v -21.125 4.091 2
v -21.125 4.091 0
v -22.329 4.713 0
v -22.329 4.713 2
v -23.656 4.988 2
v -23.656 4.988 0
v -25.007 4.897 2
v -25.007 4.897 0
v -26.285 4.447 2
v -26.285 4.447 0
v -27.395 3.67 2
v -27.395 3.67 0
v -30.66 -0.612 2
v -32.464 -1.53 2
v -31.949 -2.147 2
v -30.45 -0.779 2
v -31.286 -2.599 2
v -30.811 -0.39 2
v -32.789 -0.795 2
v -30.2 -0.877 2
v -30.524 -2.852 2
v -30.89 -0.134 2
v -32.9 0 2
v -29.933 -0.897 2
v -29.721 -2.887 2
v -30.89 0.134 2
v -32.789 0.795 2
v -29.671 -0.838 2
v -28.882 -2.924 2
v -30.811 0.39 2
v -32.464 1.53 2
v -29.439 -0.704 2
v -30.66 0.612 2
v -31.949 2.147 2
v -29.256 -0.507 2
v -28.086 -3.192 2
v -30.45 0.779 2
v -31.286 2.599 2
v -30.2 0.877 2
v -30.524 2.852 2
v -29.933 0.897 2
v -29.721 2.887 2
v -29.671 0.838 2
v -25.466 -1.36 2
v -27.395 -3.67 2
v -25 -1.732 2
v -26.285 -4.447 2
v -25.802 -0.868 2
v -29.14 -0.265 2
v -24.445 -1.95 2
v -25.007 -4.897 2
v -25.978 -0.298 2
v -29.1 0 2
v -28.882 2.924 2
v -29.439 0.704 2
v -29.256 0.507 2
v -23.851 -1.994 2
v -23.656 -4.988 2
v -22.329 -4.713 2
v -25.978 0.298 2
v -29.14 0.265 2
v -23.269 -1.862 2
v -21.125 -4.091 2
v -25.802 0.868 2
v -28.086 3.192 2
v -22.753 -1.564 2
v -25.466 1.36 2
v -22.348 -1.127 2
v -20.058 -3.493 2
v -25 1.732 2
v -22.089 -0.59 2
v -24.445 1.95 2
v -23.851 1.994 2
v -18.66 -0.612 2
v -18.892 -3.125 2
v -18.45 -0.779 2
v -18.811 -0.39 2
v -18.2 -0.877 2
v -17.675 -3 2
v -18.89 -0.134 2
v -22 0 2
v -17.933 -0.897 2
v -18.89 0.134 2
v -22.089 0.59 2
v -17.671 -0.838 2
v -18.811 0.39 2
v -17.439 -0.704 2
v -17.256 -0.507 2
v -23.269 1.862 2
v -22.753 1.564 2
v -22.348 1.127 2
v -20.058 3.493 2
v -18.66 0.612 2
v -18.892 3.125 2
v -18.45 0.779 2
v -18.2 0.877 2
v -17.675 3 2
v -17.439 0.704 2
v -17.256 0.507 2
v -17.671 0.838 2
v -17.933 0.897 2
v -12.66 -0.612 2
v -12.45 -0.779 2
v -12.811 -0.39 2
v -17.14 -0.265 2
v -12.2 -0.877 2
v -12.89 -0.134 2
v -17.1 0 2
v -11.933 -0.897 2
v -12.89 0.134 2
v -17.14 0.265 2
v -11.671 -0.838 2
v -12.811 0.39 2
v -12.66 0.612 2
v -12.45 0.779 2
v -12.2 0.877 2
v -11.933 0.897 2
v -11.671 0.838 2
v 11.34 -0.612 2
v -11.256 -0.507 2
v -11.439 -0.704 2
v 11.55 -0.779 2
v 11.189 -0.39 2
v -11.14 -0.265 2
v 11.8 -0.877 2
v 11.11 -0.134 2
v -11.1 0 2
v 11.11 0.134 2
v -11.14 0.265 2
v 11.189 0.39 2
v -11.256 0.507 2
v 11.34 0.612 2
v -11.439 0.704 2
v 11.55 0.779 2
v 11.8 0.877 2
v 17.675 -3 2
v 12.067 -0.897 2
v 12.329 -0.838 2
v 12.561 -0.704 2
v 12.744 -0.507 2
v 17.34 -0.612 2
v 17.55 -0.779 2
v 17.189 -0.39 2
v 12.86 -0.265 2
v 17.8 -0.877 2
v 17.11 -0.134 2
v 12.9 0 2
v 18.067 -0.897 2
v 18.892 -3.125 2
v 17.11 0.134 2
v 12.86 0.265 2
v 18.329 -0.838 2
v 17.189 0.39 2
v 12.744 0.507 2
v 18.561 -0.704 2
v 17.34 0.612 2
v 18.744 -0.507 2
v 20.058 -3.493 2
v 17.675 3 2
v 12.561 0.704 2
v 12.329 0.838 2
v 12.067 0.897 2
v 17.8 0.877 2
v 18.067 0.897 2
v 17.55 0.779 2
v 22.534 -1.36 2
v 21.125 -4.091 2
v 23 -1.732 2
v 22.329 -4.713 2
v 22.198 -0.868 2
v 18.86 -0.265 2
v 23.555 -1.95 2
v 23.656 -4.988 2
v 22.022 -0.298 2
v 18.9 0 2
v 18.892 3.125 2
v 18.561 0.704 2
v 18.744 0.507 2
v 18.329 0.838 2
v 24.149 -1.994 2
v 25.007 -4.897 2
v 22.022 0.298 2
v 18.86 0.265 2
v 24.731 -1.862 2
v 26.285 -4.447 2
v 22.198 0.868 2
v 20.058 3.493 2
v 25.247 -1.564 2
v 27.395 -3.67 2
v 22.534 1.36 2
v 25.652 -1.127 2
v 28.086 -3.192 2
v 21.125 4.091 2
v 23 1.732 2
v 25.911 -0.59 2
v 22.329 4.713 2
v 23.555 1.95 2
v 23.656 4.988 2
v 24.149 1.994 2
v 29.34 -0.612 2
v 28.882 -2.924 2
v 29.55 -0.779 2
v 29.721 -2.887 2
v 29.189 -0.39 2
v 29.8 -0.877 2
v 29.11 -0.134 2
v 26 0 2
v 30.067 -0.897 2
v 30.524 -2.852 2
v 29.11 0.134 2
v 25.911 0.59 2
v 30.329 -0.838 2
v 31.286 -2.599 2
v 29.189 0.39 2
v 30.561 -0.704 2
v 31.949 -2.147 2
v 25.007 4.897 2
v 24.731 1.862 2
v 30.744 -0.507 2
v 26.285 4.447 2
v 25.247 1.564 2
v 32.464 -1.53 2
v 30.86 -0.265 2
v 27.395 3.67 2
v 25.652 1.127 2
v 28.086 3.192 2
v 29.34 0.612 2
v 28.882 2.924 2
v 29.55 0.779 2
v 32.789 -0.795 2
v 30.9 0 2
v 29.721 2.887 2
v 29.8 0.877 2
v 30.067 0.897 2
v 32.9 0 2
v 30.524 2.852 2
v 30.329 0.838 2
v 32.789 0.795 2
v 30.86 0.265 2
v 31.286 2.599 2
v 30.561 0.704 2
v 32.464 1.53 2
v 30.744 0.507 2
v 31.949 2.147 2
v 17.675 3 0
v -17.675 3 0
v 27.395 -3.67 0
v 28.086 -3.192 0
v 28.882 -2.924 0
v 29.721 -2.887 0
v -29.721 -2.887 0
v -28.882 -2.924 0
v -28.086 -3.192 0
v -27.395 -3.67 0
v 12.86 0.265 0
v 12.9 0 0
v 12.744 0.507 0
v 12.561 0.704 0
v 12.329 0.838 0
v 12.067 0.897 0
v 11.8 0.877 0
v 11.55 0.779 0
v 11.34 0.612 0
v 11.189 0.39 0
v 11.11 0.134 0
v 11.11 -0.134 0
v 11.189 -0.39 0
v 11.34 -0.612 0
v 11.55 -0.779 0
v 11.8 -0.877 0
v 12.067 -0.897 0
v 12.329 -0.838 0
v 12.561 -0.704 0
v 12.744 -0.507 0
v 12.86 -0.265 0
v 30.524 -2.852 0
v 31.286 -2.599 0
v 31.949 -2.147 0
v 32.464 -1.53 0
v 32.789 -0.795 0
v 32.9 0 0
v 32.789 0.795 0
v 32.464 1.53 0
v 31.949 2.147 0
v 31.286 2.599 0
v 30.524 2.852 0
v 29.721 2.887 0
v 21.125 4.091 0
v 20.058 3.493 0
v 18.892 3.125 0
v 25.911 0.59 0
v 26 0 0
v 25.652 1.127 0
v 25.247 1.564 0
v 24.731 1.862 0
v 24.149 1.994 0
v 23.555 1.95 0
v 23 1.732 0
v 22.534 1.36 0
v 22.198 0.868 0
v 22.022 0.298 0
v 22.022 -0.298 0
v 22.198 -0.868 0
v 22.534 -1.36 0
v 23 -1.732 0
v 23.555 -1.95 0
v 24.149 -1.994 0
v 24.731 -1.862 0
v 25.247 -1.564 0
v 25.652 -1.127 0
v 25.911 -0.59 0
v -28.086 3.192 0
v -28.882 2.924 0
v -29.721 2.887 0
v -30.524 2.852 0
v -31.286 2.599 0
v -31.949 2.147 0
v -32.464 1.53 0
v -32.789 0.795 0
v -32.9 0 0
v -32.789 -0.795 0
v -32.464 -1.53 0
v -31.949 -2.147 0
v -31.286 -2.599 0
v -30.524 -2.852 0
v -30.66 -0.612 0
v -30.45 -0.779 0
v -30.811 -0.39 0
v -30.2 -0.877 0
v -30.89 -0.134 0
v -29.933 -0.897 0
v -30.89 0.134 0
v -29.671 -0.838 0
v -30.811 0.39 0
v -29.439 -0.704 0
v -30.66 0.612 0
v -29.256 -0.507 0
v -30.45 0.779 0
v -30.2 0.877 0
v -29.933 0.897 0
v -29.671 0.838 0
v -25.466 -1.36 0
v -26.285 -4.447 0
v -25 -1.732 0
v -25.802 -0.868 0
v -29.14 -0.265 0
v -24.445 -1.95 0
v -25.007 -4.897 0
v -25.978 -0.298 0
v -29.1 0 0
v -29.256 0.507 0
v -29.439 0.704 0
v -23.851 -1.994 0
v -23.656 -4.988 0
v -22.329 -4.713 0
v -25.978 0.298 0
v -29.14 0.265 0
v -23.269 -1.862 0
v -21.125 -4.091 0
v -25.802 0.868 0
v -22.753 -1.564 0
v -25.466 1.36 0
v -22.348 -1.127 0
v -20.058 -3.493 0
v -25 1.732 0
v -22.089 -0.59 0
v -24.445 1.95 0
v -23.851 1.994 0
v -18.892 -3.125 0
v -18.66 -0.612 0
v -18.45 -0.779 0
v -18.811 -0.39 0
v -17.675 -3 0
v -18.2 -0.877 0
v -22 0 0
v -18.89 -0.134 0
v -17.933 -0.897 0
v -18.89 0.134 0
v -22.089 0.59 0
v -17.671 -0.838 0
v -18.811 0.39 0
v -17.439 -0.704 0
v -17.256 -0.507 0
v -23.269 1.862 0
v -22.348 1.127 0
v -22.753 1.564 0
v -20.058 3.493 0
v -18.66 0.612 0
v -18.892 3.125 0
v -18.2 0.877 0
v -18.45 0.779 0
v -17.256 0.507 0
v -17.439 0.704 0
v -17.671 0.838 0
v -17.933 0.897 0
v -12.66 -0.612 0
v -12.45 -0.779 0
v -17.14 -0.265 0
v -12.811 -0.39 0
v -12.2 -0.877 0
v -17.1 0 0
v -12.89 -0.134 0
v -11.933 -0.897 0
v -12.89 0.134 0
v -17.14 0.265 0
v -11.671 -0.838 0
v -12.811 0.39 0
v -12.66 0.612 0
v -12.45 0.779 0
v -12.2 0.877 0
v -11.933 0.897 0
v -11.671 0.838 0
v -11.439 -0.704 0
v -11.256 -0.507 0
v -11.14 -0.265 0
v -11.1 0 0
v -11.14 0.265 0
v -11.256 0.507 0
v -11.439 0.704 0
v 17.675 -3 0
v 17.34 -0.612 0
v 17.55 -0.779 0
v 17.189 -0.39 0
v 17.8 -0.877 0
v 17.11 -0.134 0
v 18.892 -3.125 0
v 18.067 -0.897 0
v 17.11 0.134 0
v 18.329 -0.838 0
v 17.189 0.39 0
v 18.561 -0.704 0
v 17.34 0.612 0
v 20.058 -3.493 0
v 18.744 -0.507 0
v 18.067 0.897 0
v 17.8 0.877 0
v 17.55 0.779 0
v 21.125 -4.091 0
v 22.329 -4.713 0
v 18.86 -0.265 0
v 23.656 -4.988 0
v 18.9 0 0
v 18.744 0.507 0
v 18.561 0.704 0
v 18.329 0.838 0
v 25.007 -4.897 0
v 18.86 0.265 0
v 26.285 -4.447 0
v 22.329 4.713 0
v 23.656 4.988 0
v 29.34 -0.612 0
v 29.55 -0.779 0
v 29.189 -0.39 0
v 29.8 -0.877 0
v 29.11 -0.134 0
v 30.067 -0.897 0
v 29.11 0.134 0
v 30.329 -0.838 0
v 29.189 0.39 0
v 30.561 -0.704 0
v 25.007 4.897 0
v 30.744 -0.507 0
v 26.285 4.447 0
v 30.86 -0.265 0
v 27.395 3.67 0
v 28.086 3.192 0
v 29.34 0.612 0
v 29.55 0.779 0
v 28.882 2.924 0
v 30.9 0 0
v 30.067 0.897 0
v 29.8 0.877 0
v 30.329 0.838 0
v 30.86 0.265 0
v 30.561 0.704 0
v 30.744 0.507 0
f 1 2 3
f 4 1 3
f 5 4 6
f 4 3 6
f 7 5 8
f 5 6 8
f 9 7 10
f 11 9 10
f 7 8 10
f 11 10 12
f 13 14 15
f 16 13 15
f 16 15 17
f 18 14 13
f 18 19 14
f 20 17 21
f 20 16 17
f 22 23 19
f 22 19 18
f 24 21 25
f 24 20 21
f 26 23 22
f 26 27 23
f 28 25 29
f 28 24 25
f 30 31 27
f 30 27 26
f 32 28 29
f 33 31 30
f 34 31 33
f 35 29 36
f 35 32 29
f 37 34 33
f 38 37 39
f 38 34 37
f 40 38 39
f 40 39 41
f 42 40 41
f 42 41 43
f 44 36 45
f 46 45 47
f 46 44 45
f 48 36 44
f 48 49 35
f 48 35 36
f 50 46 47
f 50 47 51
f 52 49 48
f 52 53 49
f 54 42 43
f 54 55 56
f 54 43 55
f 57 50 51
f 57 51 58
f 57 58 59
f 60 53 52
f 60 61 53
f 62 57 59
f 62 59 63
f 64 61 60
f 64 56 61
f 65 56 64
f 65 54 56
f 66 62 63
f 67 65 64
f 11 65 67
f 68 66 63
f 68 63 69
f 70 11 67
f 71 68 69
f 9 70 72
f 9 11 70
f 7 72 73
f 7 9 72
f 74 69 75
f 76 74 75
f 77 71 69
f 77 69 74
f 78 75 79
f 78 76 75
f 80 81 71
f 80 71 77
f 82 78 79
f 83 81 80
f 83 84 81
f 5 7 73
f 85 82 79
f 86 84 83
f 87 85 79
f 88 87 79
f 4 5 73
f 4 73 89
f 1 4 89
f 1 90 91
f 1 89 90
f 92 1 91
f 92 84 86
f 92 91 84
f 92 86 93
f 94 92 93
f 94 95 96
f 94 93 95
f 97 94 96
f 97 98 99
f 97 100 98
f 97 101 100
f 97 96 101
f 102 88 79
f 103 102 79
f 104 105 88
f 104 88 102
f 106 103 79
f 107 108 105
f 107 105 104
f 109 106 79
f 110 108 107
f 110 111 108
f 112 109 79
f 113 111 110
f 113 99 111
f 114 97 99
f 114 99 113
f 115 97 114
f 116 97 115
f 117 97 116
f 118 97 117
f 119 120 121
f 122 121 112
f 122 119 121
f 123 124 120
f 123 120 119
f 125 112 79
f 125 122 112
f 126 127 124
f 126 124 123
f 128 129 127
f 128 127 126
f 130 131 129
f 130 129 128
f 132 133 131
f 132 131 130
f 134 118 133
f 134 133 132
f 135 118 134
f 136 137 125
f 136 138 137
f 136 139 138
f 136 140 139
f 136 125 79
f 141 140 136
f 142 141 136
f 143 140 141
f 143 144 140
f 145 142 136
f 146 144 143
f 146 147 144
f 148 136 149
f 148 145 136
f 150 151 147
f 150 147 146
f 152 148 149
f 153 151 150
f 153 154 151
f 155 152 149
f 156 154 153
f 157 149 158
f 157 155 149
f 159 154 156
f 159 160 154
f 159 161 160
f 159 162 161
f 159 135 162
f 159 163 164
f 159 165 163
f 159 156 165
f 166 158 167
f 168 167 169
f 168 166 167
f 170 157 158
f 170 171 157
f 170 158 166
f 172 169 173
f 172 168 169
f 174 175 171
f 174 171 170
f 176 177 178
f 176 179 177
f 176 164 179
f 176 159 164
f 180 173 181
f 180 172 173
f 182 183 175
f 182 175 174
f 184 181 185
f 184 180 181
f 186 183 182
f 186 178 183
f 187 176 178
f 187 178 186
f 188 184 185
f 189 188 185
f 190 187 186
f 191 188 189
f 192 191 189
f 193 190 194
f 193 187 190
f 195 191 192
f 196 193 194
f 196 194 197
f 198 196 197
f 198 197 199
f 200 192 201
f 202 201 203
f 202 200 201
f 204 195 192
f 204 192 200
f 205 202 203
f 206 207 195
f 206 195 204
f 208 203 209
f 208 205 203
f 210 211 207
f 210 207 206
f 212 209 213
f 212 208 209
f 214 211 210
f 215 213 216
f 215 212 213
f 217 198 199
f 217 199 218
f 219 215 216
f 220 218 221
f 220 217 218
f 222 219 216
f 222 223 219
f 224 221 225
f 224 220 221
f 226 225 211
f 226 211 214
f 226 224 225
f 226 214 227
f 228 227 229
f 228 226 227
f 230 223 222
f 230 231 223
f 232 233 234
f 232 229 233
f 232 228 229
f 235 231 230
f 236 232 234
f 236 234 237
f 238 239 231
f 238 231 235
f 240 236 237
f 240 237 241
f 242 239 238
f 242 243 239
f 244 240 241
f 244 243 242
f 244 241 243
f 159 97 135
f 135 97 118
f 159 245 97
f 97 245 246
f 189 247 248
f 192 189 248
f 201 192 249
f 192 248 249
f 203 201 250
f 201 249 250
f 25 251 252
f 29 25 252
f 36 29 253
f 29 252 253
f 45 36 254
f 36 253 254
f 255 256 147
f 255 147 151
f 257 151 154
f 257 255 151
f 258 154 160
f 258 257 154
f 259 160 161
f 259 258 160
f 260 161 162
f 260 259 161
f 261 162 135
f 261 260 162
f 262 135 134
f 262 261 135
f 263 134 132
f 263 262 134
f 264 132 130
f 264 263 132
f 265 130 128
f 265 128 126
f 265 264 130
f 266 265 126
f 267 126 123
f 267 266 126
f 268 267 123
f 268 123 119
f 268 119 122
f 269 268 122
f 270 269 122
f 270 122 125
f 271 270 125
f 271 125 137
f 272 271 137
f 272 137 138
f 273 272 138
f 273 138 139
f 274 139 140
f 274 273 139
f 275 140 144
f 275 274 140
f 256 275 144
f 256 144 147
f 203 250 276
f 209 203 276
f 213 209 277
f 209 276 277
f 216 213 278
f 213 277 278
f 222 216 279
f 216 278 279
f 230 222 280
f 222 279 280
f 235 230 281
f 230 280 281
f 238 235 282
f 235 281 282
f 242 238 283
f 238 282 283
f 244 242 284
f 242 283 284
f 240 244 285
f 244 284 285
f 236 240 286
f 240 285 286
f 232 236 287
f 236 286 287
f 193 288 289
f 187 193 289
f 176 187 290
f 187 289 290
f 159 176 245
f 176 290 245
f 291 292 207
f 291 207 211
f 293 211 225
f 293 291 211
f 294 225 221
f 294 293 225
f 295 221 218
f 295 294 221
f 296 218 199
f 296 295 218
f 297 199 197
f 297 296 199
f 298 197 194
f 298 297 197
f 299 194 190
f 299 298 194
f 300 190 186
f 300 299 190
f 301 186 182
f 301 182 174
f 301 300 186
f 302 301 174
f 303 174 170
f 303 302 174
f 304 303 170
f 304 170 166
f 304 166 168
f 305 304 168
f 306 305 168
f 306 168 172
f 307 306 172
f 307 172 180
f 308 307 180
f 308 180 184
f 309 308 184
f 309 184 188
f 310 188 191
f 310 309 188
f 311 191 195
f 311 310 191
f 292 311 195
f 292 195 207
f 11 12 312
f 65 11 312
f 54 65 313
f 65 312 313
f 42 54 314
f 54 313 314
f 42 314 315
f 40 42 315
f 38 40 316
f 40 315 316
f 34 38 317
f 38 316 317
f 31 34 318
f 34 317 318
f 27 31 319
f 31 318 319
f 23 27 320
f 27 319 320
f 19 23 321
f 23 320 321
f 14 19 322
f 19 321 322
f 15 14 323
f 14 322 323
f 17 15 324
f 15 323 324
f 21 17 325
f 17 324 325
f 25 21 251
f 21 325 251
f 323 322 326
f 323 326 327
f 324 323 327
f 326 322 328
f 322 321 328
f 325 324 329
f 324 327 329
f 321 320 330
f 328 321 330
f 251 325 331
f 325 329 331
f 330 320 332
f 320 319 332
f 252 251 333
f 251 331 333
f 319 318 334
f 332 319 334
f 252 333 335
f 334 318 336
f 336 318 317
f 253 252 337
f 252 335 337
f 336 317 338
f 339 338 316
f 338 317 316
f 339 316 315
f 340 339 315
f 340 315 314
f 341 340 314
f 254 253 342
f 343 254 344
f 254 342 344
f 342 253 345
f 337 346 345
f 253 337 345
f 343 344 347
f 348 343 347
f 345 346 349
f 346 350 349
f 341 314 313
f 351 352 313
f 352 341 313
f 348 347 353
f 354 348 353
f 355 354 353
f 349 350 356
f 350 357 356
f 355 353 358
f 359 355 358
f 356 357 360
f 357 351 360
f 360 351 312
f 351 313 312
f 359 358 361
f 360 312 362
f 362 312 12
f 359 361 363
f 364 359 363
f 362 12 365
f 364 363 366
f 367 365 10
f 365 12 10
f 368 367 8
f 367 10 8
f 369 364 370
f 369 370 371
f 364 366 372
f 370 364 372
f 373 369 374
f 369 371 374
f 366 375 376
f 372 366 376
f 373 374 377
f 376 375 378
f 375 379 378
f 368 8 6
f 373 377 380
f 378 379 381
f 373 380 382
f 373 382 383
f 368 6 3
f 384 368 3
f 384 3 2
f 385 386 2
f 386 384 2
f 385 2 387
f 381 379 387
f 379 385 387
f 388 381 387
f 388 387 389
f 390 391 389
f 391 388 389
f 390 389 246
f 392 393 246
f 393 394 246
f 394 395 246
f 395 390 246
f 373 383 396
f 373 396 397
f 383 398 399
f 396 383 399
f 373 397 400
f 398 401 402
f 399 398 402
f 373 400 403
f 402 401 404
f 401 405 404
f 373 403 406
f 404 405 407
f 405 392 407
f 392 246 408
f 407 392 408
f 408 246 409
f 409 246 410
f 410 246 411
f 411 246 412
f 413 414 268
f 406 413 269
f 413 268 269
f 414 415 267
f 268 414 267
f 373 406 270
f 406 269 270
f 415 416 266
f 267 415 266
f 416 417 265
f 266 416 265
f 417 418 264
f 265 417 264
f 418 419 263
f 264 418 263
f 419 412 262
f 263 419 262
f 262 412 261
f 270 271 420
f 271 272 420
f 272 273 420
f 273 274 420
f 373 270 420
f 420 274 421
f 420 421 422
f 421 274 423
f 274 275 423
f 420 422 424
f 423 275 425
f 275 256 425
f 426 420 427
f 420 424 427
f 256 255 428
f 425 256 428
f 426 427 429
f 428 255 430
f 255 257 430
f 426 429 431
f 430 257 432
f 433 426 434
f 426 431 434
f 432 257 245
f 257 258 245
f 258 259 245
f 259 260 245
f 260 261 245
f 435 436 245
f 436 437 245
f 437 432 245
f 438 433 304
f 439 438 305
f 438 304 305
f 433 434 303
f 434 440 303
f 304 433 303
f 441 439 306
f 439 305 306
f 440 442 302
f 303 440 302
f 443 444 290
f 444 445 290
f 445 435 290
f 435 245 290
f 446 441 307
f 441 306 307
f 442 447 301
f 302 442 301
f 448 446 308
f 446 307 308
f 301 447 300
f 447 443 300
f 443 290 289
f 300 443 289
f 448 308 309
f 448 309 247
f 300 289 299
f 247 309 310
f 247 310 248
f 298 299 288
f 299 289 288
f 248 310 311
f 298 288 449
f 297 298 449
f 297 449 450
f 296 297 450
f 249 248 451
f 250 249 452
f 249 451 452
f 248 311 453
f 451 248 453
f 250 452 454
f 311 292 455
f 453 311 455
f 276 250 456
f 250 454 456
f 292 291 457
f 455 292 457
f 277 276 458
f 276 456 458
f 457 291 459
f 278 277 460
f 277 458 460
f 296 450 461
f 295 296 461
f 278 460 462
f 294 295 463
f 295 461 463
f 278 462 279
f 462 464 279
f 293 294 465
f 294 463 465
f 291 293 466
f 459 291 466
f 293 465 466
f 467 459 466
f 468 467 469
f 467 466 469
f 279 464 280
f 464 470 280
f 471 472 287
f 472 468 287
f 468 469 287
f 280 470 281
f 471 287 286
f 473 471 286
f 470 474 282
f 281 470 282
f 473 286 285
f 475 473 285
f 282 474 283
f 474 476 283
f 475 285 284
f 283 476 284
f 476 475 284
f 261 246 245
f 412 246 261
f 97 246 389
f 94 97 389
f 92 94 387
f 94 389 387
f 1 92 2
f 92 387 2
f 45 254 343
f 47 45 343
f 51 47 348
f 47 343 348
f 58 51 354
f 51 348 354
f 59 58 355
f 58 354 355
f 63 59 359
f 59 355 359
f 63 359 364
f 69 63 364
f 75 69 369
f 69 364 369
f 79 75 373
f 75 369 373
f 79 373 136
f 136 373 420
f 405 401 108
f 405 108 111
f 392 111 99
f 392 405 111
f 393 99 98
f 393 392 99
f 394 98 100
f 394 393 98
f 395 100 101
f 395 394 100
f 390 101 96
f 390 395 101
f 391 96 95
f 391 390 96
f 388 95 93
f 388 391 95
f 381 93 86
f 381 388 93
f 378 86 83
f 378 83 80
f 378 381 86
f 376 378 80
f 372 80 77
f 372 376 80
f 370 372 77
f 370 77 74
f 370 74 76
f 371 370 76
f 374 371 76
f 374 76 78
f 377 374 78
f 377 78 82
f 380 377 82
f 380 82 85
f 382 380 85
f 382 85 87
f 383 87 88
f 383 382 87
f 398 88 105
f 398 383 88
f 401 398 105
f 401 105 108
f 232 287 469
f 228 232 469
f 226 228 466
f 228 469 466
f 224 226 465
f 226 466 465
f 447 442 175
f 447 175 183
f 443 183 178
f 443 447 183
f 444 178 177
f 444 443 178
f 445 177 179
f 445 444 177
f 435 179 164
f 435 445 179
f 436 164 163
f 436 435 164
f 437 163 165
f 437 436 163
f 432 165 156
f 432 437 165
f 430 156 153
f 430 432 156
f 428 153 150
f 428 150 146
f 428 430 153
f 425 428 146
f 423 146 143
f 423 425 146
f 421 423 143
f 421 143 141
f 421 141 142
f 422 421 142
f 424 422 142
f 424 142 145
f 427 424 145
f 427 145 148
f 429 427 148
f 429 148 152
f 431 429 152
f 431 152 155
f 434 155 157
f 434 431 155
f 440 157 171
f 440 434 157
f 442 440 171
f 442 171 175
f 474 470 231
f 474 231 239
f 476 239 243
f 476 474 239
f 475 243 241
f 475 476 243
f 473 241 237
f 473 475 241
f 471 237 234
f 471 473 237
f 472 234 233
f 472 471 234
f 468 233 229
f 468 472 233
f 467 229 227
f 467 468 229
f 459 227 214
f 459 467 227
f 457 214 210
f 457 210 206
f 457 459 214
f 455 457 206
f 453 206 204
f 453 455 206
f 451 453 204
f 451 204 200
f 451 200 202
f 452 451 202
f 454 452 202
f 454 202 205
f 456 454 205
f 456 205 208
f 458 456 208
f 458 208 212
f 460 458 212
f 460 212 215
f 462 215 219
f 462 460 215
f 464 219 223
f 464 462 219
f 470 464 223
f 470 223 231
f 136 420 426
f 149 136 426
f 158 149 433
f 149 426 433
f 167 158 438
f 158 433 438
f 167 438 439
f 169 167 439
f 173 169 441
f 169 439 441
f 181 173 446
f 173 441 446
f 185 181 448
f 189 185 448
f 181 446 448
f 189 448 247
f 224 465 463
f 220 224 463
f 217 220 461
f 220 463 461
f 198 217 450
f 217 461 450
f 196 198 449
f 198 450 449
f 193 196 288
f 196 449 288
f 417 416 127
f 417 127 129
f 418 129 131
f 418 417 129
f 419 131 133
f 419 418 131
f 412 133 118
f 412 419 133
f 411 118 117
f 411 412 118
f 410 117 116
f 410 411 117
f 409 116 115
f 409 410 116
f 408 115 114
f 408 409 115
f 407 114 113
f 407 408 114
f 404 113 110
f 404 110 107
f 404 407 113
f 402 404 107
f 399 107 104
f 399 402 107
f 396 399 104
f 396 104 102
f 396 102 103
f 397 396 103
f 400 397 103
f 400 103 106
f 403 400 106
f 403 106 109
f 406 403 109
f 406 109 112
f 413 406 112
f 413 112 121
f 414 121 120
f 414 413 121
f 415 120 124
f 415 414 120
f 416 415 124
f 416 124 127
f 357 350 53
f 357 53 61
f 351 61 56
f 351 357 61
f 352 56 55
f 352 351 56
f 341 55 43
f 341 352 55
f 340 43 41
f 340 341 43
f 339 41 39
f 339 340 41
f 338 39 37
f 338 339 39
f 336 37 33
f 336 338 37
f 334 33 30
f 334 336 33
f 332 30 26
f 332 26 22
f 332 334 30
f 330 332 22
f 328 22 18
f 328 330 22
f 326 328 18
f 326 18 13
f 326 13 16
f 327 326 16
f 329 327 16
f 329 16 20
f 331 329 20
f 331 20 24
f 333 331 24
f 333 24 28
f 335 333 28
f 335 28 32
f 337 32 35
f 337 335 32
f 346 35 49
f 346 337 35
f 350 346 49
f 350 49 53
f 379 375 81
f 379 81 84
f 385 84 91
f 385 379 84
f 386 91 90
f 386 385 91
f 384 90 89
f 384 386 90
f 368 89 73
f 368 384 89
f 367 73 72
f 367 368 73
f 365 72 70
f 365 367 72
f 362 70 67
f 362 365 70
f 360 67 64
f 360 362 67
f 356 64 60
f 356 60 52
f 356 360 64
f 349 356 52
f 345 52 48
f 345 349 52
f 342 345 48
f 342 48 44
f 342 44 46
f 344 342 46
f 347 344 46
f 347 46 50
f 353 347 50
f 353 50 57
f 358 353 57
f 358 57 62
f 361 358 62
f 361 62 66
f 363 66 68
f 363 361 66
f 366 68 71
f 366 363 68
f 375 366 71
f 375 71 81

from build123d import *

# Parameters (mm, degrees)
F0_R     = 0.9
F0_R_2   = 2
F1_DEPTH = 2


with BuildPart() as f1:
    # F0 (on Top) → F1 (new body)
    with BuildSketch(Plane.XY):
        with BuildLine():
            Line((-17.6754446797, -3), (0, -3))
            Line((0, -3), (17.6754446797, -3))
            ThreePointArc((17.6754446797, -3), (19.4845127471, -3.2792244645), (21.1252021271, -4.0909090909))
            ThreePointArc((21.1252021271, -4.0909090909), (24.3345748945, -4.9887934052), (27.3953125, -3.6704022978))
            ThreePointArc((27.3953125, -3.6704022978), (28.474361287, -3.0297630587), (29.721059322, -2.8865536715))
            ThreePointArc((29.721059322, -2.8865536715), (32.9, 0), (29.721059322, 2.8865536715))
            ThreePointArc((29.721059322, 2.8865536715), (28.474361287, 3.0297630587), (27.3953125, 3.6704022978))
            ThreePointArc((27.3953125, 3.6704022978), (24.3345748945, 4.9887934052), (21.1252021271, 4.0909090909))
            ThreePointArc((21.1252021271, 4.0909090909), (19.4845127471, 3.2792244645), (17.6754446797, 3))
            Line((17.6754446797, 3), (0, 3))
            Line((0, 3), (-17.6754446797, 3))
            ThreePointArc((-17.6754446797, 3), (-19.4845127471, 3.2792244645), (-21.1252021271, 4.0909090909))
            ThreePointArc((-21.1252021271, 4.0909090909), (-24.3345748945, 4.9887934052), (-27.3953125, 3.6704022978))
            ThreePointArc((-27.3953125, 3.6704022978), (-28.474361287, 3.0297630587), (-29.721059322, 2.8865536715))
            ThreePointArc((-29.721059322, 2.8865536715), (-32.9, 0), (-29.721059322, -2.8865536715))
            ThreePointArc((-29.721059322, -2.8865536715), (-28.474361287, -3.0297630587), (-27.3953125, -3.6704022978))
            ThreePointArc((-27.3953125, -3.6704022978), (-24.3345748945, -4.9887934052), (-21.1252021271, -4.0909090909))
            ThreePointArc((-21.1252021271, -4.0909090909), (-19.4845127471, -3.2792244645), (-17.6754446797, -3))
        make_face()
        with Locations((-30, 0)):
            Circle(F0_R, mode=Mode.SUBTRACT)
        with Locations((-24, 0)):
            Circle(F0_R_2, mode=Mode.SUBTRACT)
        with Locations((-18, 0)):
            Circle(F0_R, mode=Mode.SUBTRACT)
        with Locations((-12, 0)):
            Circle(F0_R, mode=Mode.SUBTRACT)
        with Locations((12, 0)):
            Circle(F0_R, mode=Mode.SUBTRACT)
        with Locations((18, 0)):
            Circle(F0_R, mode=Mode.SUBTRACT)
        with Locations((24, 0)):
            Circle(F0_R_2, mode=Mode.SUBTRACT)
        with Locations((30, 0)):
            Circle(F0_R, mode=Mode.SUBTRACT)
    extrude(amount=F1_DEPTH)


solid = f1.part
